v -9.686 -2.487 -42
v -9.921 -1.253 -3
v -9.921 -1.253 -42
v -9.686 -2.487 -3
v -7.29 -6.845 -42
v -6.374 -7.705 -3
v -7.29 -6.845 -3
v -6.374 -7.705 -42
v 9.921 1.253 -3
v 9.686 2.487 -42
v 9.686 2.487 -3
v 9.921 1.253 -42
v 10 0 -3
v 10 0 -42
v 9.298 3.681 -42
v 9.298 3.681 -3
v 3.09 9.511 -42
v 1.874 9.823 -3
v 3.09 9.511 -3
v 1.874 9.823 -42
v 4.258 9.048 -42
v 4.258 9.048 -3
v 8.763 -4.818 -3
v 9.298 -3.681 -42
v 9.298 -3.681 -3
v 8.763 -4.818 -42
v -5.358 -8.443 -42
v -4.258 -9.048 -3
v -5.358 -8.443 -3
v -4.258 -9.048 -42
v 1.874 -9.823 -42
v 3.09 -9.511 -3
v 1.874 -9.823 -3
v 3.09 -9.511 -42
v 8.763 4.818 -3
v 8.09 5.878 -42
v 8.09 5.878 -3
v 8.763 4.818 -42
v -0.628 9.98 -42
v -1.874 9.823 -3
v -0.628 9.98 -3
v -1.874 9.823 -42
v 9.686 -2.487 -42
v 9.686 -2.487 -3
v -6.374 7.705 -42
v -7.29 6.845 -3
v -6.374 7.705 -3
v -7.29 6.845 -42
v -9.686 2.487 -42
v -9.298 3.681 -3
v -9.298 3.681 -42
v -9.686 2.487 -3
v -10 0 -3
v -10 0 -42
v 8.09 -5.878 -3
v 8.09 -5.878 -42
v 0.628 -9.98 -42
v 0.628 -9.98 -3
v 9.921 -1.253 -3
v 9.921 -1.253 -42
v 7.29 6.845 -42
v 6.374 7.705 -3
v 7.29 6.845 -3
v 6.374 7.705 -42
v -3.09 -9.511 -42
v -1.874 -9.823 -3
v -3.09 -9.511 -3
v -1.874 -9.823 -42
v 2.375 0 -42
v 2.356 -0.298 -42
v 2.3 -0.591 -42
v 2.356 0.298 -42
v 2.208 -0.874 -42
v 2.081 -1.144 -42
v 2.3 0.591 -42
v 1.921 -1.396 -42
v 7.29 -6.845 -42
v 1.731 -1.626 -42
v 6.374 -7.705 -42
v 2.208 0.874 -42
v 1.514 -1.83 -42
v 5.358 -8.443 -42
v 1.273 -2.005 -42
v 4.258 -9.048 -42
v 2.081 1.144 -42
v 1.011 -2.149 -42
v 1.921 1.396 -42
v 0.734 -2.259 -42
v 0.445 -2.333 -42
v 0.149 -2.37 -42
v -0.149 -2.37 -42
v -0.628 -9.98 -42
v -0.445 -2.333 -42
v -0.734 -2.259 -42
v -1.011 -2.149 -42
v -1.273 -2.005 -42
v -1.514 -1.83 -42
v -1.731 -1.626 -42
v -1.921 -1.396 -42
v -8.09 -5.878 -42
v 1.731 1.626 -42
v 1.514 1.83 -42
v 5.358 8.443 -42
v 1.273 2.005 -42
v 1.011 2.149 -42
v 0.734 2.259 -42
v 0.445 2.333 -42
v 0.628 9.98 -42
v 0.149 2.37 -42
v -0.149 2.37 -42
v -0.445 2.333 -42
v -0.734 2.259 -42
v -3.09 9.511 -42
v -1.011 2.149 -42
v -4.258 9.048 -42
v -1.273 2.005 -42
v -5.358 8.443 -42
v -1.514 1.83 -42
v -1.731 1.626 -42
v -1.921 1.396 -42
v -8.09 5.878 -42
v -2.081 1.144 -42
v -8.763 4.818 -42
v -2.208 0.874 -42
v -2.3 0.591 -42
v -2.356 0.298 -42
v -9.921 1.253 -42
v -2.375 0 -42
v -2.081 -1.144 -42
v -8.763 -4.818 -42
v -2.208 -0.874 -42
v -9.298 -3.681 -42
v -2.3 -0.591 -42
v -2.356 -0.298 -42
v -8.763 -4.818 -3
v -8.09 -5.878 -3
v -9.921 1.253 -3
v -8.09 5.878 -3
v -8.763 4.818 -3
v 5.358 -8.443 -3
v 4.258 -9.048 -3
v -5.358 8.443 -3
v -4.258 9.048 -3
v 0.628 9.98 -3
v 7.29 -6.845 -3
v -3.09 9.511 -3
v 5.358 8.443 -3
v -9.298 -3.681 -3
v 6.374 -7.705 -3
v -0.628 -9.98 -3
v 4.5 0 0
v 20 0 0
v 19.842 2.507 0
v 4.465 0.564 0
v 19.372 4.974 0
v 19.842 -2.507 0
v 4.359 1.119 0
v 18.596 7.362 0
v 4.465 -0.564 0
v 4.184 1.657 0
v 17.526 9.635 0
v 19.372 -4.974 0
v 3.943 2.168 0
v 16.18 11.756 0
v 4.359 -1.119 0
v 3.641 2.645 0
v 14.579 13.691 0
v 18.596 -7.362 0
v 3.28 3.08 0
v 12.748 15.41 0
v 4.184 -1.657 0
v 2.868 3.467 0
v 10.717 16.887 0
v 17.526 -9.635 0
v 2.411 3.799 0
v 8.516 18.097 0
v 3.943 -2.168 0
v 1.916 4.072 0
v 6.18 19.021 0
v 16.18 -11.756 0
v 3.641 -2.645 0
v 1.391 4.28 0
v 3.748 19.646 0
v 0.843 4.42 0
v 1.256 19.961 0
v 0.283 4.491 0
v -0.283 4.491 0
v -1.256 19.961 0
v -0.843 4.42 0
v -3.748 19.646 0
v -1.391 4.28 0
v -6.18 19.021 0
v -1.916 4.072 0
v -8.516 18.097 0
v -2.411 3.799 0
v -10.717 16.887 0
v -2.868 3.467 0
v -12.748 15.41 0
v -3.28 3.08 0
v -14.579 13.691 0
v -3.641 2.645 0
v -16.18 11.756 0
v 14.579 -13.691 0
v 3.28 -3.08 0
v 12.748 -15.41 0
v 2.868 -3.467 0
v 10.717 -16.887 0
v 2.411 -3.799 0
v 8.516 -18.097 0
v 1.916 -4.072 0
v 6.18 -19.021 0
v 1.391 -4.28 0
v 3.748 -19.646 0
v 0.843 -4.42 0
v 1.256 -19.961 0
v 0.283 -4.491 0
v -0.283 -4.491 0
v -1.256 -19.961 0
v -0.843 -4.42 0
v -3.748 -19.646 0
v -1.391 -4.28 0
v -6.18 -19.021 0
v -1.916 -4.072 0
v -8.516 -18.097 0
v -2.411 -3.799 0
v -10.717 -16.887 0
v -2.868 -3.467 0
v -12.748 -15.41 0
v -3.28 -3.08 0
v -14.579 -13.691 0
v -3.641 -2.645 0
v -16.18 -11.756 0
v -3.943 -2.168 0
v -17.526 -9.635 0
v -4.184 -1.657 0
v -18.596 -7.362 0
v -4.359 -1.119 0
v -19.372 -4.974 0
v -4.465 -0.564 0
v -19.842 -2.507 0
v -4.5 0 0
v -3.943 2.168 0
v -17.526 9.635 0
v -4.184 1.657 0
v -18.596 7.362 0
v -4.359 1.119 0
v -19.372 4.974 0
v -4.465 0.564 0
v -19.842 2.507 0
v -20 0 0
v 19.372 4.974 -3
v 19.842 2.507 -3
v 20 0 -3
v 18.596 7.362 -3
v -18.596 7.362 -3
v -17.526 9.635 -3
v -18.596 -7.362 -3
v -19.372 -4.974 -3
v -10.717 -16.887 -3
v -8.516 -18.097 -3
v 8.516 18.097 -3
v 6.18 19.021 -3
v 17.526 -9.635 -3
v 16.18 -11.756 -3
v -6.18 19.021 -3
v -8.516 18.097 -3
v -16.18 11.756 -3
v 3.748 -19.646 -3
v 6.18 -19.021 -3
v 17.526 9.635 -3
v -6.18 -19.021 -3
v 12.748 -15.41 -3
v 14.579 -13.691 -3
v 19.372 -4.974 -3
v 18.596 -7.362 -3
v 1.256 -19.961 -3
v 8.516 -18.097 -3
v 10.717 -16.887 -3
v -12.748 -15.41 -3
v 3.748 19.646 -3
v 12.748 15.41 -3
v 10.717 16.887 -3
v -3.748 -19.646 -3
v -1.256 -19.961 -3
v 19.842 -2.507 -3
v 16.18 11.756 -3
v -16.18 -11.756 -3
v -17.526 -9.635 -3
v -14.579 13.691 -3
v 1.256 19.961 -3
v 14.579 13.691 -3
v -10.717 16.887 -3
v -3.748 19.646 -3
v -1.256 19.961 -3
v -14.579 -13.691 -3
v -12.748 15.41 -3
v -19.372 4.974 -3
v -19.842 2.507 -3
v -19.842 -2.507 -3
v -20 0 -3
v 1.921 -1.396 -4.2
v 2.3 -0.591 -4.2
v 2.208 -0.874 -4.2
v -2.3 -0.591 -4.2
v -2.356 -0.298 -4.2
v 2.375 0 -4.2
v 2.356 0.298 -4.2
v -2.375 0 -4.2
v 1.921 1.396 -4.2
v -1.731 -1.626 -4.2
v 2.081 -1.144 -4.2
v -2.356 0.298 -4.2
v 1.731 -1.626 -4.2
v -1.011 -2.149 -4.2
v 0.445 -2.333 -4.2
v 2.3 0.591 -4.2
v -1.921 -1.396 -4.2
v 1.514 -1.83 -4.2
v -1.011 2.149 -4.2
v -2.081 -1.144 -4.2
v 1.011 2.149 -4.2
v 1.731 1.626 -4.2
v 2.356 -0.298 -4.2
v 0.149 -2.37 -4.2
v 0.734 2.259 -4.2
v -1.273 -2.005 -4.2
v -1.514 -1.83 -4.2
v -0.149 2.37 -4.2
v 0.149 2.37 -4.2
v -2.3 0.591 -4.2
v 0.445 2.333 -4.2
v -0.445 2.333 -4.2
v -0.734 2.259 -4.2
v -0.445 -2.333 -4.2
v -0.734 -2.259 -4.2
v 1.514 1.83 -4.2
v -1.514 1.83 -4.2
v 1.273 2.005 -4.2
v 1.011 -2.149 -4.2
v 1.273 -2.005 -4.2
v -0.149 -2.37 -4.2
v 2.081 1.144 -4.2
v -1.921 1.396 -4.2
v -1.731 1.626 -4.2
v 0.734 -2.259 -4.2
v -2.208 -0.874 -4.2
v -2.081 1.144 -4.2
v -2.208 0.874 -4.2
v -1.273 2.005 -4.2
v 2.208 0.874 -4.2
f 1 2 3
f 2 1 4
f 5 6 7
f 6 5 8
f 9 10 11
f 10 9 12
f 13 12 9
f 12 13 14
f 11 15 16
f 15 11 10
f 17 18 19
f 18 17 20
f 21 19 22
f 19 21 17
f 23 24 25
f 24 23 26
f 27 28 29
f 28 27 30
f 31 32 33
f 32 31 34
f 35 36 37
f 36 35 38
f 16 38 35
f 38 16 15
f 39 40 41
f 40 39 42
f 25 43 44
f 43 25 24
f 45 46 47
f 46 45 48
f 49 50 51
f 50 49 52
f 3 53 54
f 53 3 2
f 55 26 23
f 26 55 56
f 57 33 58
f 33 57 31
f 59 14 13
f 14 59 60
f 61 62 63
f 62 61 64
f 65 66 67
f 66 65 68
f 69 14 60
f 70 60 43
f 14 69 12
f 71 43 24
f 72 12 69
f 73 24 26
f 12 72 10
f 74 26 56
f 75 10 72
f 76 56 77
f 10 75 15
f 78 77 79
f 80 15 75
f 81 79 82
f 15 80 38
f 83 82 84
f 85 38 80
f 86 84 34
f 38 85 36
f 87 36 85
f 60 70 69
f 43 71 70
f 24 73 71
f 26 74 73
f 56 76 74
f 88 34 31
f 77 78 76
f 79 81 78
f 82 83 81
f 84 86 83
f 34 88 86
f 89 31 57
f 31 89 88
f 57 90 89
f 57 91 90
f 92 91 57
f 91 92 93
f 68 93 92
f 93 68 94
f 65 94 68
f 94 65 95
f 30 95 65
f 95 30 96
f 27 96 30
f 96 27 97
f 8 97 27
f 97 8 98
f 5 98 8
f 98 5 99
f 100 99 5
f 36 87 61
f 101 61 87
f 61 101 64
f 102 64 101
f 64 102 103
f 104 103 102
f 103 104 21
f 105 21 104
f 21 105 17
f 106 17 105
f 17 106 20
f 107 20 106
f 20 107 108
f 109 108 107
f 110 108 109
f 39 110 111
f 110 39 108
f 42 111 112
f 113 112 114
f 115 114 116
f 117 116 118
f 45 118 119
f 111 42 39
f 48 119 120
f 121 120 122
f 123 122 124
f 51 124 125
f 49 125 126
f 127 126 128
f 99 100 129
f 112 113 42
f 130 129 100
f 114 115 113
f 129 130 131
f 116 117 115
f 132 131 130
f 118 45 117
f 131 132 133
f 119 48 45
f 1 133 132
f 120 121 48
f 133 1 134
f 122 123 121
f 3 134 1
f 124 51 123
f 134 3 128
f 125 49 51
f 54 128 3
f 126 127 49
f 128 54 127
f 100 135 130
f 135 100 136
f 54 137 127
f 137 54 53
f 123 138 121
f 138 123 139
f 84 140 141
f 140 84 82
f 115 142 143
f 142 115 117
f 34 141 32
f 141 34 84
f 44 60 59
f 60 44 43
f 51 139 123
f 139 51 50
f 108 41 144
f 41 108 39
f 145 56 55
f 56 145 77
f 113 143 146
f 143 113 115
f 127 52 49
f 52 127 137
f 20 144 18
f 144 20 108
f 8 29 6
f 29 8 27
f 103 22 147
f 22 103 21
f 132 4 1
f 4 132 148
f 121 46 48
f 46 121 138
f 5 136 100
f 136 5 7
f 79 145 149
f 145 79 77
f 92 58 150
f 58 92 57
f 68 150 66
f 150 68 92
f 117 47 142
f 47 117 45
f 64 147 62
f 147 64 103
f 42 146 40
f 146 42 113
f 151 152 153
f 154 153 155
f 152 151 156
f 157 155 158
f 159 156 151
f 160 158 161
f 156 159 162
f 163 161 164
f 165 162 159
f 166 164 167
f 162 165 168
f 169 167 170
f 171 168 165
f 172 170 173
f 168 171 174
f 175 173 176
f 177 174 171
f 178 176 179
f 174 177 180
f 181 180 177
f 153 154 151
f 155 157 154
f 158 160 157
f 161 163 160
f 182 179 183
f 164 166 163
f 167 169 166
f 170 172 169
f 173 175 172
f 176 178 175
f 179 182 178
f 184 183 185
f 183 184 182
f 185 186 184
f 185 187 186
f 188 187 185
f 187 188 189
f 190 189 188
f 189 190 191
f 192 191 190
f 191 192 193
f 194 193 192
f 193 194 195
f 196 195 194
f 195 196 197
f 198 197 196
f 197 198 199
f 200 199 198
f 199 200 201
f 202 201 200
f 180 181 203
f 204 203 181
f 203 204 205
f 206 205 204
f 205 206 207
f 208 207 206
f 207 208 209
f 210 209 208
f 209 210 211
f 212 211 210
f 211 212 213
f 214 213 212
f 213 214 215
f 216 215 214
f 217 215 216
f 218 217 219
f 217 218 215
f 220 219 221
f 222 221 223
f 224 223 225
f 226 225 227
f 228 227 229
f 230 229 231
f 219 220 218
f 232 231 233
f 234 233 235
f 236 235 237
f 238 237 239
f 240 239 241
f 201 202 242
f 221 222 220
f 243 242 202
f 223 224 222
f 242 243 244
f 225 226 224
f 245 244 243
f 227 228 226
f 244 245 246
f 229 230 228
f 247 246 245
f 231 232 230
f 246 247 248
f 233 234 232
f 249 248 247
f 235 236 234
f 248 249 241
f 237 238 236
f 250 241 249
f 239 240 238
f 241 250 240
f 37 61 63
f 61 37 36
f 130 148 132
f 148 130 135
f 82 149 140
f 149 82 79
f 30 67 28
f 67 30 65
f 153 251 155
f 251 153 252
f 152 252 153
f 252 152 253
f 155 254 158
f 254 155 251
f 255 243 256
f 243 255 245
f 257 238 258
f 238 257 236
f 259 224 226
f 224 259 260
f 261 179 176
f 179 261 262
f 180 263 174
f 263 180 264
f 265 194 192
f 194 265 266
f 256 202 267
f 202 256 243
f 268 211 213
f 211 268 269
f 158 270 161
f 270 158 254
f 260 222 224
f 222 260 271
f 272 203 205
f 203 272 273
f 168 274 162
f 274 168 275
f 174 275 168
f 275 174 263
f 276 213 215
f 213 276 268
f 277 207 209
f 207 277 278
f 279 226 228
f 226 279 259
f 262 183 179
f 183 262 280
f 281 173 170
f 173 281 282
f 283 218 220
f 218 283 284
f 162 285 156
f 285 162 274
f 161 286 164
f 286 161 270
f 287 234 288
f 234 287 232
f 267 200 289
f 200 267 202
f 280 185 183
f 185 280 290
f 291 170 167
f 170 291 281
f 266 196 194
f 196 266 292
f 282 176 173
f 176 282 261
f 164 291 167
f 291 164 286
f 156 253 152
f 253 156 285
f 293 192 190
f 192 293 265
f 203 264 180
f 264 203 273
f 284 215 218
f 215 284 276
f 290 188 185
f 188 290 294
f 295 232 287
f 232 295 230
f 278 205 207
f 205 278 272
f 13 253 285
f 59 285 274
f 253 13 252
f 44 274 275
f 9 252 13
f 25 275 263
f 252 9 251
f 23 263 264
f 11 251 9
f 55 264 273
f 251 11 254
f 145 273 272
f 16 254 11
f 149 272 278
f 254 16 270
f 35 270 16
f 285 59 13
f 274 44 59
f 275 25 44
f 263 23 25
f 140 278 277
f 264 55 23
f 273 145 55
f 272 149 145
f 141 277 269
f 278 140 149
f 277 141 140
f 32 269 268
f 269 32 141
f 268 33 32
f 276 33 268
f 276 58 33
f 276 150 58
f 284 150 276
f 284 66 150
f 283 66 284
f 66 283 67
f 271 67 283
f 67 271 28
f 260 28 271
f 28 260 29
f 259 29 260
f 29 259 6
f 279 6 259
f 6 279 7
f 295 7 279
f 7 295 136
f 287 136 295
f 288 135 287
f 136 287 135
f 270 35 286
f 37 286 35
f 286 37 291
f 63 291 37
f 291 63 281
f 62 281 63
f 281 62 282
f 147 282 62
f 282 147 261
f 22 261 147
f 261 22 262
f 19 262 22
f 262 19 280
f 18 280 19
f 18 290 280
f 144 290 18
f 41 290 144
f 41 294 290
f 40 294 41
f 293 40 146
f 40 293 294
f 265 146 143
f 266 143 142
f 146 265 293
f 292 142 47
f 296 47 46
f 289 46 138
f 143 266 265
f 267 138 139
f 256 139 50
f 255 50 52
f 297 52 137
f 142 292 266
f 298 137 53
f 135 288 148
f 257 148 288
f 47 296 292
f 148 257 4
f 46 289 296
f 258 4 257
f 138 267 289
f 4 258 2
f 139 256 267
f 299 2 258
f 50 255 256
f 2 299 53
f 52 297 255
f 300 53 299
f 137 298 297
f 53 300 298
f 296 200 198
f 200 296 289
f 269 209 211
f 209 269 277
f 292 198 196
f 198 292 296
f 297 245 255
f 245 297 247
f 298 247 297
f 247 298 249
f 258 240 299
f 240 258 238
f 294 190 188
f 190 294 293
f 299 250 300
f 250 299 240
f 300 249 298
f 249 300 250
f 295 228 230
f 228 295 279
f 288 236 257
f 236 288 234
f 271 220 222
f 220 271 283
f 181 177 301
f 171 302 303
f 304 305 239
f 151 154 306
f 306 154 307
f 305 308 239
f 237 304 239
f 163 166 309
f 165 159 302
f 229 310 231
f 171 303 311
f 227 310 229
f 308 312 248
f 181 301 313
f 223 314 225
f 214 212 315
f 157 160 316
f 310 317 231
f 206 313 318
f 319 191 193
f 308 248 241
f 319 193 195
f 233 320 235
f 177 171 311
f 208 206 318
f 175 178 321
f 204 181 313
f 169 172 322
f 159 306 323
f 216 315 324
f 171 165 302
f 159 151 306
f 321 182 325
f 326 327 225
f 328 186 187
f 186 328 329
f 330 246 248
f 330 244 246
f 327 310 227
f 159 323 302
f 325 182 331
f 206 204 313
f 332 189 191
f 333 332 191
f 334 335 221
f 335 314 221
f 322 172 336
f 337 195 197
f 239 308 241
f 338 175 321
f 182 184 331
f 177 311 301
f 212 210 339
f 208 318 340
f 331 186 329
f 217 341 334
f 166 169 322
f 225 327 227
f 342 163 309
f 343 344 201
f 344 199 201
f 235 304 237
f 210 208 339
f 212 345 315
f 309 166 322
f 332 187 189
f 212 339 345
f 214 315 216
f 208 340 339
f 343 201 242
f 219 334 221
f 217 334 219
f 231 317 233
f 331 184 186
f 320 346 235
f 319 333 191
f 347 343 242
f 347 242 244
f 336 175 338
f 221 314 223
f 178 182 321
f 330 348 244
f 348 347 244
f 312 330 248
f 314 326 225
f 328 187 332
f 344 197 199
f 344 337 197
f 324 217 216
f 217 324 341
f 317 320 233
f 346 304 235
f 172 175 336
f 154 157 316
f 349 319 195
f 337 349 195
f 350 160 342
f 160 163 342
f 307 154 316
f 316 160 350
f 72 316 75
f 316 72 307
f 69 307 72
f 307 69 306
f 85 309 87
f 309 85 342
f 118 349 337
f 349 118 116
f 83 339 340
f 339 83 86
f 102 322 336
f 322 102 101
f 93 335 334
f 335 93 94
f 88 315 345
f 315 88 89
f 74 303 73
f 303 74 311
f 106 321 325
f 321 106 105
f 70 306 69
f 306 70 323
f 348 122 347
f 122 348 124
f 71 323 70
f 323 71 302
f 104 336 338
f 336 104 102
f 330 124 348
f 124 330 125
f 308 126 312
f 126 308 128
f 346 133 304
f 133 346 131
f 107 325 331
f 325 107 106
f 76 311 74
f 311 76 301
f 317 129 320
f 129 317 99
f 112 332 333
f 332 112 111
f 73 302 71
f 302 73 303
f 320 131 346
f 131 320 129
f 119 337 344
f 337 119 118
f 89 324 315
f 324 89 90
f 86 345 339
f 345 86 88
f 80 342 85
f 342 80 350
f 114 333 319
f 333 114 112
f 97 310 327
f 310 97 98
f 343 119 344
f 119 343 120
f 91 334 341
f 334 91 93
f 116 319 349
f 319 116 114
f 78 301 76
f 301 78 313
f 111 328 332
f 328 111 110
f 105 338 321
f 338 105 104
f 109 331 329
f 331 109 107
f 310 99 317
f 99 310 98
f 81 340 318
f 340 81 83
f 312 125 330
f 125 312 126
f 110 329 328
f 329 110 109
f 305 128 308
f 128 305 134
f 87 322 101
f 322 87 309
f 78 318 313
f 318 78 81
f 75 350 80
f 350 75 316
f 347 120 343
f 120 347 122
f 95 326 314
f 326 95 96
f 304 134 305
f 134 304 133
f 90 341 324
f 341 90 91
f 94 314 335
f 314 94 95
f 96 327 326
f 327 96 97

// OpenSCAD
$fn = 50;


difference() {
	union() {
		translate(v = [0, 0, -42.0000000000]) {
			cylinder(h = 42, r = 10.0000000000);
		}
		translate(v = [0, 0, -3.0000000000]) {
			cylinder(h = 3, r = 20.0000000000);
		}
	}
	union() {
		translate(v = [0, 0, 0]) {
			rotate(a = [0, 0, 0]) {
				difference() {
					union() {
						#translate(v = [0, 0, -42.0000000000]) {
							cylinder(h = 42, r = 2.2500000000);
						}
						#translate(v = [0, 0, -4.2000000000]) {
							cylinder(h = 4.2000000000, r1 = 2.3750000000, r2 = 4.5000000000);
						}
						#translate(v = [0, 0, -42.0000000000]) {
							cylinder(h = 42, r = 2.3750000000);
						}
						#translate(v = [0, 0, -42.0000000000]) {
							cylinder(h = 42, r = 2.2500000000);
						}
					}
					union();
				}
			}
		}
	}
}
